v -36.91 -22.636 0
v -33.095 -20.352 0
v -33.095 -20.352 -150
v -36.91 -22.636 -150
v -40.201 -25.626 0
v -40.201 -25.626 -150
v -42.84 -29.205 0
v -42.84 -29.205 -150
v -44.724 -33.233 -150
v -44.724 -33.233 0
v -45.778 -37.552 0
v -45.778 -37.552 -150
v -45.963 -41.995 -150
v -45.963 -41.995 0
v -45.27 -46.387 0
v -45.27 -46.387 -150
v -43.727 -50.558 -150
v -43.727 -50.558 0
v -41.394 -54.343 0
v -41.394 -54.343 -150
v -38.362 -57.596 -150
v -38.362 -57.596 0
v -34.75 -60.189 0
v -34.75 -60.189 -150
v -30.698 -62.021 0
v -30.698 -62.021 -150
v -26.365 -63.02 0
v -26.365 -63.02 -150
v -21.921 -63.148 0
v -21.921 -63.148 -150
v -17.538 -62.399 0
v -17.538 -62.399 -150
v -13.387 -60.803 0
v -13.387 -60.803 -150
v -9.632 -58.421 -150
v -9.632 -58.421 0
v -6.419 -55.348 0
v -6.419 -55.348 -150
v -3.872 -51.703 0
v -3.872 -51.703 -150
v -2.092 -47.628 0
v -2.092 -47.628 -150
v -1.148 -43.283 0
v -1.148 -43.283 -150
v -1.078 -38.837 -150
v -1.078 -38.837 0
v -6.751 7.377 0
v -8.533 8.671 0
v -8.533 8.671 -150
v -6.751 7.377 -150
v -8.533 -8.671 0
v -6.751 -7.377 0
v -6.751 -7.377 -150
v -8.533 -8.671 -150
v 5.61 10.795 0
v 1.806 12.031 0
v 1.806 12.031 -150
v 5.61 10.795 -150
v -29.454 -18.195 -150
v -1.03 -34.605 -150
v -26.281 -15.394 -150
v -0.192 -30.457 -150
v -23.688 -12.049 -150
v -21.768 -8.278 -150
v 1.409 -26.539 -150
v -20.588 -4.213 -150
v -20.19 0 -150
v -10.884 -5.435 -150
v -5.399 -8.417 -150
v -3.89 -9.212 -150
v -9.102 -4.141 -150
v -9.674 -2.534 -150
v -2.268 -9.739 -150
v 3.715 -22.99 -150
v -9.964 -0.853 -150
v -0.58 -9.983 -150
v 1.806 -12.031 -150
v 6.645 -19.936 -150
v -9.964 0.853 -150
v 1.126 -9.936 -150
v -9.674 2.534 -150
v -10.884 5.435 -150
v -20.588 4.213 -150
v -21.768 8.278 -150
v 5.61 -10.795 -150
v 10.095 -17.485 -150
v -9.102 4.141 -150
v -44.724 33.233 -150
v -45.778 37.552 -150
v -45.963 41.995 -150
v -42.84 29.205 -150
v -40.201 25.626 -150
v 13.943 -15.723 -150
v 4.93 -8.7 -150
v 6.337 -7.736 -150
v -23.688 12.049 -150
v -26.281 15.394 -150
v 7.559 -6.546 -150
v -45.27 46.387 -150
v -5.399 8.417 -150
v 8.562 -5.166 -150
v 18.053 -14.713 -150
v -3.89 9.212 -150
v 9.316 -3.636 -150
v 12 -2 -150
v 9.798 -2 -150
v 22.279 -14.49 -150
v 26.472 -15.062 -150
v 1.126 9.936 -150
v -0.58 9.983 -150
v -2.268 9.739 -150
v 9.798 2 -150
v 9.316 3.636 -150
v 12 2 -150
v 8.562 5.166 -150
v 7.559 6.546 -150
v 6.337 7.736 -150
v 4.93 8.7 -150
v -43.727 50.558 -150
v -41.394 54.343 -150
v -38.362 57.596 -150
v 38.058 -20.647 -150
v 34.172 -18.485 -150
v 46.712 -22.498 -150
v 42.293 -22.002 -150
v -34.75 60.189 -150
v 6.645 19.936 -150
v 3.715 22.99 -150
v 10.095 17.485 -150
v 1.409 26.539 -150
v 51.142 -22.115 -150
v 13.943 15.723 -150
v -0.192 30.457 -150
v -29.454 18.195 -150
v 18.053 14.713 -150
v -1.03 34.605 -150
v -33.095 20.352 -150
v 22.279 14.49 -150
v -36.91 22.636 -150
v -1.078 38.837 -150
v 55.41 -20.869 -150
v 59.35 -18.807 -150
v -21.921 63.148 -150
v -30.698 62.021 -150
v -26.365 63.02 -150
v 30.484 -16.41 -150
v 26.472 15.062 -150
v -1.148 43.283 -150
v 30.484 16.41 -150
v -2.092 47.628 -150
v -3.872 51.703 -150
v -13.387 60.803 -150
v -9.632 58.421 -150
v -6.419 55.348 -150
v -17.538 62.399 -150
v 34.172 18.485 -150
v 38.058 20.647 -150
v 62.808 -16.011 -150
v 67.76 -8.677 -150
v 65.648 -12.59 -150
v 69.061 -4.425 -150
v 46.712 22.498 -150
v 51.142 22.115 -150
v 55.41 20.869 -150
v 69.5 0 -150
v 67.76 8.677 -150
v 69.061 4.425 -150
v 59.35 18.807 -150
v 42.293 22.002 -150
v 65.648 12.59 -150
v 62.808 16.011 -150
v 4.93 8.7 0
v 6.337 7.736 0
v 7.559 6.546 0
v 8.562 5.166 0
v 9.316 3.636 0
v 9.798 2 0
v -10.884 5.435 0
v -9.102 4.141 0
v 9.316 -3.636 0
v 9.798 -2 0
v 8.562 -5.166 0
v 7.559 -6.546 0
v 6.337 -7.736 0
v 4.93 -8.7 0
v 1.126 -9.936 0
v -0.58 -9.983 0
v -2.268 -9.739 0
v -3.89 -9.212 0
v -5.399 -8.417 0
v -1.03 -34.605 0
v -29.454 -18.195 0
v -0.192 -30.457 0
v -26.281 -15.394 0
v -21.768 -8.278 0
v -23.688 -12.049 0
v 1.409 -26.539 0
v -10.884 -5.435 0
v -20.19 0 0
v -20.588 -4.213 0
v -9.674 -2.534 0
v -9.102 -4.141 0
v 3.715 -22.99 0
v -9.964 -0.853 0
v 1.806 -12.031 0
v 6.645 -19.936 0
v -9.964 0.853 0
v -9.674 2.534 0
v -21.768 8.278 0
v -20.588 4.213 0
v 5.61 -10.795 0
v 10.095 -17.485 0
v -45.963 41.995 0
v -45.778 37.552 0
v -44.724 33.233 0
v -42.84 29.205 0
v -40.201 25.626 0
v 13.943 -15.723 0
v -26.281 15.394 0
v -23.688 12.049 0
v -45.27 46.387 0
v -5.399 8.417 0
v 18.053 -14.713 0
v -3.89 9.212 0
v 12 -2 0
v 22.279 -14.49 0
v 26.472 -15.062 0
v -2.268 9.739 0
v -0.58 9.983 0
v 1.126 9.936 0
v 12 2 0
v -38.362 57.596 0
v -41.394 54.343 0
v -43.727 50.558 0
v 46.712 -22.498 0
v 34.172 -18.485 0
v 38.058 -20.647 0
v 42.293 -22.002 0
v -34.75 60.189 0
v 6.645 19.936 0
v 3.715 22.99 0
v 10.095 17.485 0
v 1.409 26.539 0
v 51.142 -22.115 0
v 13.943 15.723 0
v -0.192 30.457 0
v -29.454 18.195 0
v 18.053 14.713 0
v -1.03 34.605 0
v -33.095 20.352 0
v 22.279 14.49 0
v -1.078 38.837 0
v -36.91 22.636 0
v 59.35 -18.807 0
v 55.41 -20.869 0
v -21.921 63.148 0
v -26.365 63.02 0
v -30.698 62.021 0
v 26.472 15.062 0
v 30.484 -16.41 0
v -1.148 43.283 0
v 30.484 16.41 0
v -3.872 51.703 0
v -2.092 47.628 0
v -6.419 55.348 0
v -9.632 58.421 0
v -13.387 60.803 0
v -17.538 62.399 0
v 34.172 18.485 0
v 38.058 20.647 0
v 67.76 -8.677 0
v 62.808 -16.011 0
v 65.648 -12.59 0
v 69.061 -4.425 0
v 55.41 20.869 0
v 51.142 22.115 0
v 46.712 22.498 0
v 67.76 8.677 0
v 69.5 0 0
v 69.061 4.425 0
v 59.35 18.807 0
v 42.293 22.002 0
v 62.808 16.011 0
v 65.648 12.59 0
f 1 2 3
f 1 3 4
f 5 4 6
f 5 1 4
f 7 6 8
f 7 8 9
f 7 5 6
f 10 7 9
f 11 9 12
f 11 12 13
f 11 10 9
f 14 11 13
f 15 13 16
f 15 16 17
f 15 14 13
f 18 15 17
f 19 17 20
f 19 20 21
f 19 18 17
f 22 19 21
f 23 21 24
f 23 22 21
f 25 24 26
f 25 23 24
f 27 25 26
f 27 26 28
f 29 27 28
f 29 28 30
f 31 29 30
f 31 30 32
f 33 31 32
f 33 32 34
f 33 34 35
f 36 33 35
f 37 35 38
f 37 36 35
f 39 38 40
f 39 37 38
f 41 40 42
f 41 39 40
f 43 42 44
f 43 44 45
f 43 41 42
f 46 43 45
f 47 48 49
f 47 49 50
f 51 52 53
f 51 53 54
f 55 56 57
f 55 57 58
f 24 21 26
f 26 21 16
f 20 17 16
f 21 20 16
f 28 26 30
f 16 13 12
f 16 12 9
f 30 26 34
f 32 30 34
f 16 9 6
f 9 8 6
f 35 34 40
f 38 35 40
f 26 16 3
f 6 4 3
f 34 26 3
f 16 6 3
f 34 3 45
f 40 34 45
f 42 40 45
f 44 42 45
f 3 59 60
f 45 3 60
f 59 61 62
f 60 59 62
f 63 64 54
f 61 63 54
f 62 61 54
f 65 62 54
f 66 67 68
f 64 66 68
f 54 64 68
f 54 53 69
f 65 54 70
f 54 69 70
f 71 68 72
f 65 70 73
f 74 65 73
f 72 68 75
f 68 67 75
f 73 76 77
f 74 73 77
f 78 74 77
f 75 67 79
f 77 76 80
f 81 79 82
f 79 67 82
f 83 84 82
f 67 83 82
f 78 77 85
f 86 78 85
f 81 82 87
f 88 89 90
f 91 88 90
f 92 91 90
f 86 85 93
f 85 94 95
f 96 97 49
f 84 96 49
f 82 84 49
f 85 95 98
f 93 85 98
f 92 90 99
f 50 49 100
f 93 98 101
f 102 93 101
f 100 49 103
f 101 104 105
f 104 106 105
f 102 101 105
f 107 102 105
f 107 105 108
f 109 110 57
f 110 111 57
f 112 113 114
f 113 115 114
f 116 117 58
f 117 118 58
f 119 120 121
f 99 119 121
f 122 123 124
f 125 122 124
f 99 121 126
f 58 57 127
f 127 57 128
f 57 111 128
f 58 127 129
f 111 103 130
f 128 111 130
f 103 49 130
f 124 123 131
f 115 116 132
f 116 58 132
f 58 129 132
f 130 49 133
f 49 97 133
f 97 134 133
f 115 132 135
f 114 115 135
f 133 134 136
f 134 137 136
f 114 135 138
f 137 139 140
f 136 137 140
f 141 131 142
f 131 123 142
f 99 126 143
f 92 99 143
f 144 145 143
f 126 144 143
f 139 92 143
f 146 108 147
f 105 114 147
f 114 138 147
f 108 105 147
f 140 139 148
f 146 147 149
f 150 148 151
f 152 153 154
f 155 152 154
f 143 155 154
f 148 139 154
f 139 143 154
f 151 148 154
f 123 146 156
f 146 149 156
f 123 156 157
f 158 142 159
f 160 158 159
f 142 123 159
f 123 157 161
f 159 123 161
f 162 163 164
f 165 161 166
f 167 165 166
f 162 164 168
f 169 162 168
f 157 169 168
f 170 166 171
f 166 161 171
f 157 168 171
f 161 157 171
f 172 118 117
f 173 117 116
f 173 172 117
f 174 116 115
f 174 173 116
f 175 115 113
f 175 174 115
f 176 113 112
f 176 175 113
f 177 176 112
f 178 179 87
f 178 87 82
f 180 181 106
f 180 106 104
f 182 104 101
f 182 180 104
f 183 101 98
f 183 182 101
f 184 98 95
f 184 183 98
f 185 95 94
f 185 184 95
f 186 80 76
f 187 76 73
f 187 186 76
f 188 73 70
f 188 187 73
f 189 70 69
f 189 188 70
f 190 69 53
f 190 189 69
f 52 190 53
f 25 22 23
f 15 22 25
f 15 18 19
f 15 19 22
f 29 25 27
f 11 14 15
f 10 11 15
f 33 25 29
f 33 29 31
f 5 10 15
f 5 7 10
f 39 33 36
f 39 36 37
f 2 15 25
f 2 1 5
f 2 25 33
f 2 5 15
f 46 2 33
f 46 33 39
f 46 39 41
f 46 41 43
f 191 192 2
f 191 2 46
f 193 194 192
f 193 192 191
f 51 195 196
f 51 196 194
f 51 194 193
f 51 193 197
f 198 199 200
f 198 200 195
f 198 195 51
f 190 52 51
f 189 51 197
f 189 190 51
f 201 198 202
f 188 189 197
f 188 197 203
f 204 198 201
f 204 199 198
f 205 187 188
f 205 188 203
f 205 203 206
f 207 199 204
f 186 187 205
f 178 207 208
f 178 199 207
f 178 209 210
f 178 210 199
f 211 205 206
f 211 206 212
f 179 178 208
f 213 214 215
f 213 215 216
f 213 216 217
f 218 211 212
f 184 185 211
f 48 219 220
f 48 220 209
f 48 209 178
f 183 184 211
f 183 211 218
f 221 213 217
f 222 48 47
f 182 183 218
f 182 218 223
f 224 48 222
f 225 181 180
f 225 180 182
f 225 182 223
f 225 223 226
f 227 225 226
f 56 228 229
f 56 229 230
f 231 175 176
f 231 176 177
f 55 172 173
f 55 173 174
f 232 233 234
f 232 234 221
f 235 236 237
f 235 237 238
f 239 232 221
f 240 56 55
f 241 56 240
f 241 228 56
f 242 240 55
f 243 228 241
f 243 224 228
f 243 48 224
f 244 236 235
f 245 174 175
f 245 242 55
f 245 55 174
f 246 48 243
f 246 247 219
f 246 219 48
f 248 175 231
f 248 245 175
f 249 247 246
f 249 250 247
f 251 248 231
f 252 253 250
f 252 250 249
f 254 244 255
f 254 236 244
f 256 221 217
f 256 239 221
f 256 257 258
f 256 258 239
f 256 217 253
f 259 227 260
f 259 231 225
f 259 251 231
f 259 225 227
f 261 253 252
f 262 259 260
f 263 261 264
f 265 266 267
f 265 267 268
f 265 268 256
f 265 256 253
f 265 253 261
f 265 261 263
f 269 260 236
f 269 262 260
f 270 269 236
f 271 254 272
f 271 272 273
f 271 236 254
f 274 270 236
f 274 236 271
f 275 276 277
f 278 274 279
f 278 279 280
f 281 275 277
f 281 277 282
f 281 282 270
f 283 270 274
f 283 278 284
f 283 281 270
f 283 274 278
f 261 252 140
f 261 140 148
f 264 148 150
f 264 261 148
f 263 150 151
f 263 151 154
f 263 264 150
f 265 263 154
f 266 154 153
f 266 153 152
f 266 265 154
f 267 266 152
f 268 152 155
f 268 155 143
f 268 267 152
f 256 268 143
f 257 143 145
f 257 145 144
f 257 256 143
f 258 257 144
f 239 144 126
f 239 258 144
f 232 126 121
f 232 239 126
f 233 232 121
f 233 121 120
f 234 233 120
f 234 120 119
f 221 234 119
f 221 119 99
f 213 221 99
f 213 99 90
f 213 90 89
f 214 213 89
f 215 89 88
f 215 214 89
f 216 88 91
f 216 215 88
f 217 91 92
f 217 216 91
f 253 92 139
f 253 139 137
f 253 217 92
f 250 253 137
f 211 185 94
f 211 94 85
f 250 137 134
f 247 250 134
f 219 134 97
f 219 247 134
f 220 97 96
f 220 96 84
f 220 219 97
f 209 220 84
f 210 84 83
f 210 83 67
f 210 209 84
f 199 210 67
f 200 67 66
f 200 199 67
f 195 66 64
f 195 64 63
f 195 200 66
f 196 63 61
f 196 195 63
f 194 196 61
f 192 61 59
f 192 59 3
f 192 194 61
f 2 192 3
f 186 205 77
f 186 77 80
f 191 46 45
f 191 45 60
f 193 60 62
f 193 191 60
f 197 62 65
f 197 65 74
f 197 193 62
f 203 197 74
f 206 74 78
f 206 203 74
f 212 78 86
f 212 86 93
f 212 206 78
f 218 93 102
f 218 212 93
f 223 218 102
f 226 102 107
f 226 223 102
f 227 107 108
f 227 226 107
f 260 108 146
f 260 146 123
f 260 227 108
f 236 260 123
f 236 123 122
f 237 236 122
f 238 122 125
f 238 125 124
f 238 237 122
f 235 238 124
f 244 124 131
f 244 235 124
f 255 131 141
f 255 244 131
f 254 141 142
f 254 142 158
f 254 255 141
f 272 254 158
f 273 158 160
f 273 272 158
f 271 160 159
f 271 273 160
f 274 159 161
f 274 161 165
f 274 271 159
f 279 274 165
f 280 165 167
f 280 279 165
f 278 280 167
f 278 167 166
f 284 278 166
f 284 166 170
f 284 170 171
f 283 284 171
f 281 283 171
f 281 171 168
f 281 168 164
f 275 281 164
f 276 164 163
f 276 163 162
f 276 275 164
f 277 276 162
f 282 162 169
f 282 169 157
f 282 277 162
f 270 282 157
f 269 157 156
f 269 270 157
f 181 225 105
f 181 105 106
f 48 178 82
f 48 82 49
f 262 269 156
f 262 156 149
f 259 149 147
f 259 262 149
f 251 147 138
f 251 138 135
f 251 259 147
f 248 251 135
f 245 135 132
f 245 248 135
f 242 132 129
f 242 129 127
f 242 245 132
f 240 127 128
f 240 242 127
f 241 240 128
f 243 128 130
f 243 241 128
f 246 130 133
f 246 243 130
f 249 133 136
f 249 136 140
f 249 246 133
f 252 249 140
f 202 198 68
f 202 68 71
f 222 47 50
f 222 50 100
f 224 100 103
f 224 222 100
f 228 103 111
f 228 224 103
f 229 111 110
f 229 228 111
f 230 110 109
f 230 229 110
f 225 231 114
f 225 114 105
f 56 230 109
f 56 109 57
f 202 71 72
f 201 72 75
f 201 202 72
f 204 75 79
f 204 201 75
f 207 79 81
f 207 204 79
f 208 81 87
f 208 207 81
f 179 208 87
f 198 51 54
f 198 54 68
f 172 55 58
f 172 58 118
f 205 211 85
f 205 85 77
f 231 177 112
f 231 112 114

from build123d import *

# Parameters (mm, degrees)
BOSS_EXTRUDE1_DEPTH = 150
CUT_EXTRUDE1_DEPTH  = 177.988399984


with BuildPart() as part:
    # Sketch1 → Boss-Extrude1 (new body)
    with BuildSketch(Plane.XY):
        with BuildLine():
            ThreePointArc((34.172460266, -18.485243422), (69.5, 0), (34.172460266, 18.485243422))
            ThreePointArc((34.172460266, 18.485243422), (10.094920531, 17.484915258), (-1.077539734, 38.836840411))
            ThreePointArc((-1.077539734, 38.836840411), (-34.75, 60.188765563), (-33.094920531, 20.351596989))
            ThreePointArc((-33.094920531, 20.351596989), (-20.189841062, 0), (-33.094920531, -20.351596989))
            ThreePointArc((-33.094920531, -20.351596989), (-34.75, -60.188765563), (-1.077539734, -38.836840411))
            ThreePointArc((-1.077539734, -38.836840411), (10.094920531, -17.484915258), (34.172460266, -18.485243422))
        make_face()
    extrude(amount=-BOSS_EXTRUDE1_DEPTH)

    # Sketch2 → Cut-Extrude1 (cut, through all)
    with BuildSketch(Plane.XY):
        with BuildLine():
            Line((9.797958971, 2), (12, 2))
            Line((12, 2), (12, -2))
            Line((12, -2), (9.797958971, -2))
            ThreePointArc((9.797958971, -2), (8.090169944, -5.877852523), (4.929848865, -8.700378737))
            Line((4.929848865, -8.700378737), (5.610316965, -10.794644207))
            Line((5.610316965, -10.794644207), (1.8060909, -12.030712184))
            Line((1.8060909, -12.030712184), (1.1256228, -9.936446715))
            ThreePointArc((1.1256228, -9.936446715), (-3.090169944, -9.510565163), (-6.751144813, -7.377129775))
            Line((-6.751144813, -7.377129775), (-8.532633428, -8.671457016))
            Line((-8.532633428, -8.671457016), (-10.883774437, -5.435389039))
            Line((-10.883774437, -5.435389039), (-9.102285822, -4.141061797))
            ThreePointArc((-9.102285822, -4.141061797), (-10, 0), (-9.102285822, 4.141061797))
            Line((-9.102285822, 4.141061797), (-10.883774437, 5.435389039))
            Line((-10.883774437, 5.435389039), (-8.532633428, 8.671457016))
            Line((-8.532633428, 8.671457016), (-6.751144813, 7.377129775))
            ThreePointArc((-6.751144813, 7.377129775), (-3.090169944, 9.510565163), (1.1256228, 9.936446715))
            Line((1.1256228, 9.936446715), (1.8060909, 12.030712184))
            Line((1.8060909, 12.030712184), (5.610316965, 10.794644207))
            Line((5.610316965, 10.794644207), (4.929848865, 8.700378737))
            ThreePointArc((4.929848865, 8.700378737), (8.090169944, 5.877852523), (9.797958971, 2))
        make_face()
    extrude(amount=-CUT_EXTRUDE1_DEPTH, mode=Mode.SUBTRACT)


solid = part.part
